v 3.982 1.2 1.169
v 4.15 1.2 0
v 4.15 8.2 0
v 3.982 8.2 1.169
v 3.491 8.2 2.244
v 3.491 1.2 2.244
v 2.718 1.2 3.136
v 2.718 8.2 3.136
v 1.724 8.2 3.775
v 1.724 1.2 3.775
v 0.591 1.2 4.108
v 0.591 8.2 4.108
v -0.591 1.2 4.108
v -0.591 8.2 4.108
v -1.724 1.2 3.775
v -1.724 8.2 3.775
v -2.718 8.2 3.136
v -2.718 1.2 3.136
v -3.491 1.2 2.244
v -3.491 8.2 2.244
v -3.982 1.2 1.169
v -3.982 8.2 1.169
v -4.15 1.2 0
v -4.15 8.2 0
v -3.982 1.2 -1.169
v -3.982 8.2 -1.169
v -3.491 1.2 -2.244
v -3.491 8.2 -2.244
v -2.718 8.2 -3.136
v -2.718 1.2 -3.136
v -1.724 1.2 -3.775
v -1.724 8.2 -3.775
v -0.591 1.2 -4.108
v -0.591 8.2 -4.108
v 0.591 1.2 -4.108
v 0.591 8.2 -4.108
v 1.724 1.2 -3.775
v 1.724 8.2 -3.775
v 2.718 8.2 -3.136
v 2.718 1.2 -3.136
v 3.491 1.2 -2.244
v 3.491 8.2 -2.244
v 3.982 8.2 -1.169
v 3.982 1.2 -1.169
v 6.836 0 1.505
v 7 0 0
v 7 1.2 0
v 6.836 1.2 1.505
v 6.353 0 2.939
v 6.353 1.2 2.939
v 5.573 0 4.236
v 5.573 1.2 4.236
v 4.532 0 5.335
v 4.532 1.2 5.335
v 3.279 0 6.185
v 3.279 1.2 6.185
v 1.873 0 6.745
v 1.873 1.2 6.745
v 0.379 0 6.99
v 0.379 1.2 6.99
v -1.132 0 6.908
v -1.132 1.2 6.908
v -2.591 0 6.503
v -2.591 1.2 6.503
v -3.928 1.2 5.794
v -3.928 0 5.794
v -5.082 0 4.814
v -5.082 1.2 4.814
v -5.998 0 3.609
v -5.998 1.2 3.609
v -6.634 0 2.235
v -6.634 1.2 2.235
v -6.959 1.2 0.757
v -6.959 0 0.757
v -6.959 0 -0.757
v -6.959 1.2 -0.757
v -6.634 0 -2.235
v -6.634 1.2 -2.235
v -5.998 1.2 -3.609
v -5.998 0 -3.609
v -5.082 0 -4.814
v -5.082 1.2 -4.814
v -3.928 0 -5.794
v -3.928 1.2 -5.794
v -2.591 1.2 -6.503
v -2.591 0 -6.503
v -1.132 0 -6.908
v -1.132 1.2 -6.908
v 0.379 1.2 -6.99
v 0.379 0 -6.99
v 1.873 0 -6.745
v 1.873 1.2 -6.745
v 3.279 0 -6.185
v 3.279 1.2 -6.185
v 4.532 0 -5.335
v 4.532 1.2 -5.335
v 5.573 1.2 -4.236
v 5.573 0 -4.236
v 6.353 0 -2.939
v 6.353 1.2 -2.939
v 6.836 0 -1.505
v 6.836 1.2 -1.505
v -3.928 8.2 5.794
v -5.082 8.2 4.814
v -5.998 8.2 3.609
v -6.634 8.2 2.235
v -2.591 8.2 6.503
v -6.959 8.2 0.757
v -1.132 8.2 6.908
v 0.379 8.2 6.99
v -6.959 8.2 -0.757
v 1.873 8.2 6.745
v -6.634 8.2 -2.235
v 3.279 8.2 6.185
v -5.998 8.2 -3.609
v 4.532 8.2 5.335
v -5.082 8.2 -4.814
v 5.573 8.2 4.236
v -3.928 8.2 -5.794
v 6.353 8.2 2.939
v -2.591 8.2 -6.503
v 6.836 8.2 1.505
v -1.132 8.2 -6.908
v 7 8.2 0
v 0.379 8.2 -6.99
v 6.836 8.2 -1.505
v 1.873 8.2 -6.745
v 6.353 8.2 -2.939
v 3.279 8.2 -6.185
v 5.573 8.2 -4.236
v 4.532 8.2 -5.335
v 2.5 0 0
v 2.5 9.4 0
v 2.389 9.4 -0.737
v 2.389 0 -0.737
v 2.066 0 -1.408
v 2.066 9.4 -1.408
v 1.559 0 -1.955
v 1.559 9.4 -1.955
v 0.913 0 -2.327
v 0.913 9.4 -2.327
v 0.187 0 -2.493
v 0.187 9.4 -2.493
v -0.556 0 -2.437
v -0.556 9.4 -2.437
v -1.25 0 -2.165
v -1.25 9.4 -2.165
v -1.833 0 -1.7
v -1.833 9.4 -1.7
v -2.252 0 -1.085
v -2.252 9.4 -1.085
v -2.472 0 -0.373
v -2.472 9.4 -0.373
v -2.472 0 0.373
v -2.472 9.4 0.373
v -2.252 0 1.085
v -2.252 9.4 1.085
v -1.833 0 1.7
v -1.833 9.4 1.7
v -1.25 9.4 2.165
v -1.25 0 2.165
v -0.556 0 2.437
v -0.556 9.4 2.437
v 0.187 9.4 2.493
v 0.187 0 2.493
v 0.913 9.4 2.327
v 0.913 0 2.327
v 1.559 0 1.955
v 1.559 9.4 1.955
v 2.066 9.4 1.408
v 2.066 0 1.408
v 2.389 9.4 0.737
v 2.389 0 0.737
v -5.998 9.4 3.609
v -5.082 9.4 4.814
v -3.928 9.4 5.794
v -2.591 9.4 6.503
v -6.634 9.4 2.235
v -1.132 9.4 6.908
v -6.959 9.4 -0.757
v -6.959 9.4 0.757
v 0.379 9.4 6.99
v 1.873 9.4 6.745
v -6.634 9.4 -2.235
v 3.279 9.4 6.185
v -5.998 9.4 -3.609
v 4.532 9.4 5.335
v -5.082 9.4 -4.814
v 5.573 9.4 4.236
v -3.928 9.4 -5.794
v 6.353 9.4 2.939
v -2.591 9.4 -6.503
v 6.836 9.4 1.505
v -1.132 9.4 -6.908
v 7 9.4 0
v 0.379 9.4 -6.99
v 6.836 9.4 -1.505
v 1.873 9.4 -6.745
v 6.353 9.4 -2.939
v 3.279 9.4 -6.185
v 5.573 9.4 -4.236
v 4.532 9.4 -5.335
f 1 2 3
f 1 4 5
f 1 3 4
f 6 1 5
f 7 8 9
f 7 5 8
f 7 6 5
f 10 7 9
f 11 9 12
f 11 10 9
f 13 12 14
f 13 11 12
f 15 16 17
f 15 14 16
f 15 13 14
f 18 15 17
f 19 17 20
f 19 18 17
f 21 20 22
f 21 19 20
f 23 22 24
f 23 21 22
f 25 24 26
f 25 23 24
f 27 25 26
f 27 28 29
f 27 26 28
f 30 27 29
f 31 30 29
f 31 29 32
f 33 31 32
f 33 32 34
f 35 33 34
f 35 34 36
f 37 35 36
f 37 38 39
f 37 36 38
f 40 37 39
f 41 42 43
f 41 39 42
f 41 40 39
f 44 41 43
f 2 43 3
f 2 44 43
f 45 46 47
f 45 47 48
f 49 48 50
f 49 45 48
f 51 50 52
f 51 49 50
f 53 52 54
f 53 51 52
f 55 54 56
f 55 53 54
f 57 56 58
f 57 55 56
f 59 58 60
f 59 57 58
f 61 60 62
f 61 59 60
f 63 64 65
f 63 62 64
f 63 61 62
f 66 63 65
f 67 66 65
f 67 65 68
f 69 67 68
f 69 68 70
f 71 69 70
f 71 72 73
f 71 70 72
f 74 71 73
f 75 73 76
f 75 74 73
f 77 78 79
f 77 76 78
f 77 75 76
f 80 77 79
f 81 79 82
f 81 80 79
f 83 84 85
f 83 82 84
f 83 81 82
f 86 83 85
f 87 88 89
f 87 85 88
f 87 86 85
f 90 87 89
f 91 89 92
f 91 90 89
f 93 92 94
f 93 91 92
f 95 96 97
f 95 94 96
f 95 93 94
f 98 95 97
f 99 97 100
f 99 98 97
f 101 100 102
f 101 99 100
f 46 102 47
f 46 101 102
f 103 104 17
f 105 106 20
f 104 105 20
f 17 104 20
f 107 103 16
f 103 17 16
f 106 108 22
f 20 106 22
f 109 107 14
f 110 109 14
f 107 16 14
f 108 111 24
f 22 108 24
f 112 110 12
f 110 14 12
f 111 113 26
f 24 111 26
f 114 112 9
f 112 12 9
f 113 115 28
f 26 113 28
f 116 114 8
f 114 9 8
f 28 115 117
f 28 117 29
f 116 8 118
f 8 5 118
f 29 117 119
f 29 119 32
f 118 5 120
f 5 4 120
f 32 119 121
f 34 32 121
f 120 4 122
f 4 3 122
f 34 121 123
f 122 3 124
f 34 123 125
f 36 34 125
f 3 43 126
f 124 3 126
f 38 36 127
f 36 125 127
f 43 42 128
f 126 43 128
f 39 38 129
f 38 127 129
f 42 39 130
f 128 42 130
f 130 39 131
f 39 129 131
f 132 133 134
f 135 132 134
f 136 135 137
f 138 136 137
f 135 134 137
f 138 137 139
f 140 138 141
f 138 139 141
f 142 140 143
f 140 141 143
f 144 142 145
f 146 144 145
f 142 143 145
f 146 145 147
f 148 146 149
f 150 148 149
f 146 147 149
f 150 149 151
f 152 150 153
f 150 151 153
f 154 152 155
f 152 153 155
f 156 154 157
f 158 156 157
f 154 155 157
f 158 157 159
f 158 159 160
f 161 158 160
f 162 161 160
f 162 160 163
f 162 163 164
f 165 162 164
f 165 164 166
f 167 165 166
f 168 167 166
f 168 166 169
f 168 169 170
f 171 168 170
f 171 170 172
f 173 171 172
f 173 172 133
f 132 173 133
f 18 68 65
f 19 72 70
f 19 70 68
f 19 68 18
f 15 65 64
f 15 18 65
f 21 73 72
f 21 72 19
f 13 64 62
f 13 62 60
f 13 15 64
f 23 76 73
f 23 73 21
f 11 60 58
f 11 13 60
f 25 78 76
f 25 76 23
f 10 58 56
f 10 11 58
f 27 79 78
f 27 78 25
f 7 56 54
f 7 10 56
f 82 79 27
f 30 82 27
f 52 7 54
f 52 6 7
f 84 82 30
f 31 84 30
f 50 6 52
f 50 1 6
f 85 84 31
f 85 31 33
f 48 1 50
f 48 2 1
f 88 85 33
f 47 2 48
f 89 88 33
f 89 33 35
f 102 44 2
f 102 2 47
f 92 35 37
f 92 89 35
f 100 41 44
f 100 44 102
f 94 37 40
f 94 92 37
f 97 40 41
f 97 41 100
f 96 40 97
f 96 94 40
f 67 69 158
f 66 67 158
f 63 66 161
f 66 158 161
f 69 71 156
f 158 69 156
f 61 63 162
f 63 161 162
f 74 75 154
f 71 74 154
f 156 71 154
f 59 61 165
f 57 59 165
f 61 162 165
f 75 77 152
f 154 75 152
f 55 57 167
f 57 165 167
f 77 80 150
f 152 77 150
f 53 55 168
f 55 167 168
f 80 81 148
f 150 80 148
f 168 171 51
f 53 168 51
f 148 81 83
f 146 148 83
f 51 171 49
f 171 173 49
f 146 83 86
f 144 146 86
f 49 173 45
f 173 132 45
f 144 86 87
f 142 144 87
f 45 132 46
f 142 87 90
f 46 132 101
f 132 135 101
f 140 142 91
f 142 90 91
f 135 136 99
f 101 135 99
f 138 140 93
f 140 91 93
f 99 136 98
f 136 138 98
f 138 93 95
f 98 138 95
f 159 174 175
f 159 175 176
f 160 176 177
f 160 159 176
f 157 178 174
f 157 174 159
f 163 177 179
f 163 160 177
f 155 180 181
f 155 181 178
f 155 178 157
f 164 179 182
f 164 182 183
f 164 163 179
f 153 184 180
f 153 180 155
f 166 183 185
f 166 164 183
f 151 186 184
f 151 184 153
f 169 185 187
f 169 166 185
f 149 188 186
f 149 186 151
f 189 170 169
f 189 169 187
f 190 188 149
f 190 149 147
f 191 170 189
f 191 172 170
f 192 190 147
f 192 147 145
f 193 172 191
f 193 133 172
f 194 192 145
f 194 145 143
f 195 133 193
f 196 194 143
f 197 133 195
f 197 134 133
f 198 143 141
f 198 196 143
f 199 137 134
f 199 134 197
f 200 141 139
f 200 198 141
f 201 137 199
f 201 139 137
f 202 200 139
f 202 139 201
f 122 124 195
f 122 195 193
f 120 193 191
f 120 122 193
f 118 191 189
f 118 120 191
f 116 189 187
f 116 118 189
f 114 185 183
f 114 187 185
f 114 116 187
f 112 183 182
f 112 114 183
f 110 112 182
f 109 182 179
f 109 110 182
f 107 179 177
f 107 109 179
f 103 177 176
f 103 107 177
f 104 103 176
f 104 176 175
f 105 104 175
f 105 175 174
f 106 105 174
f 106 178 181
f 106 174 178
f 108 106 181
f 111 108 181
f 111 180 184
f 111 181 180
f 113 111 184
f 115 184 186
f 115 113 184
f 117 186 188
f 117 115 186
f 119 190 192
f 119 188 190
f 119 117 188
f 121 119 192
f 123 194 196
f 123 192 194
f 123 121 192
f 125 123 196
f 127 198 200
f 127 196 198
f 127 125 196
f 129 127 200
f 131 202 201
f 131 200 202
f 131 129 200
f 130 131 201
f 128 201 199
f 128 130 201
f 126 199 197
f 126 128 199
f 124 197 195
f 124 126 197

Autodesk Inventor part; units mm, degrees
ref_plane "YZ Plane" through (0, 0, 0) normal (1, 0, 0) x (0, 1, 0)
ref_plane "XZ Plane" through (0, 0, 0) normal (0, 1, 0) x (-1, 0, 0)
ref_plane "XY Plane" through (0, 0, 0) normal (0, 0, 1) x (1, 0, 0)
sketch "Sketch1" plane through (0, 0, 0) normal (0, 0, 1) x (1, 0, 0)
  line L0 (2.5, 0) -> (2.5, 9.4)
  line L1 (2.5, 9.4) -> (7, 9.4)
  line L2 (7, 9.4) -> (7, 8.2)
  line L3 (7, 8.2) -> (4.15, 8.2)
  line L4 (4.15, 8.2) -> (4.15, 1.2)
  line L5 (4.15, 1.2) -> (7, 1.2)
  line L6 (7, 1.2) -> (7, 0)
  line L7 (7, 0) -> (2.5, 0)
  line L8 (0, 0) -> (0, 3.2914)
  dimension "d0" = 2.5
  dimension "d2" = 9.4
  dimension "d3" = 1.2
  dimension "d4" = 1.2
  dimension "d5" = 7
  dimension "d6" = 4.15
revolve "Revolution1" add sketch "Sketch1" angle 360 about axis through (0, 0, 0) along (0, 1, 0)
properties part number "XcrLeftPulleyAlu"
